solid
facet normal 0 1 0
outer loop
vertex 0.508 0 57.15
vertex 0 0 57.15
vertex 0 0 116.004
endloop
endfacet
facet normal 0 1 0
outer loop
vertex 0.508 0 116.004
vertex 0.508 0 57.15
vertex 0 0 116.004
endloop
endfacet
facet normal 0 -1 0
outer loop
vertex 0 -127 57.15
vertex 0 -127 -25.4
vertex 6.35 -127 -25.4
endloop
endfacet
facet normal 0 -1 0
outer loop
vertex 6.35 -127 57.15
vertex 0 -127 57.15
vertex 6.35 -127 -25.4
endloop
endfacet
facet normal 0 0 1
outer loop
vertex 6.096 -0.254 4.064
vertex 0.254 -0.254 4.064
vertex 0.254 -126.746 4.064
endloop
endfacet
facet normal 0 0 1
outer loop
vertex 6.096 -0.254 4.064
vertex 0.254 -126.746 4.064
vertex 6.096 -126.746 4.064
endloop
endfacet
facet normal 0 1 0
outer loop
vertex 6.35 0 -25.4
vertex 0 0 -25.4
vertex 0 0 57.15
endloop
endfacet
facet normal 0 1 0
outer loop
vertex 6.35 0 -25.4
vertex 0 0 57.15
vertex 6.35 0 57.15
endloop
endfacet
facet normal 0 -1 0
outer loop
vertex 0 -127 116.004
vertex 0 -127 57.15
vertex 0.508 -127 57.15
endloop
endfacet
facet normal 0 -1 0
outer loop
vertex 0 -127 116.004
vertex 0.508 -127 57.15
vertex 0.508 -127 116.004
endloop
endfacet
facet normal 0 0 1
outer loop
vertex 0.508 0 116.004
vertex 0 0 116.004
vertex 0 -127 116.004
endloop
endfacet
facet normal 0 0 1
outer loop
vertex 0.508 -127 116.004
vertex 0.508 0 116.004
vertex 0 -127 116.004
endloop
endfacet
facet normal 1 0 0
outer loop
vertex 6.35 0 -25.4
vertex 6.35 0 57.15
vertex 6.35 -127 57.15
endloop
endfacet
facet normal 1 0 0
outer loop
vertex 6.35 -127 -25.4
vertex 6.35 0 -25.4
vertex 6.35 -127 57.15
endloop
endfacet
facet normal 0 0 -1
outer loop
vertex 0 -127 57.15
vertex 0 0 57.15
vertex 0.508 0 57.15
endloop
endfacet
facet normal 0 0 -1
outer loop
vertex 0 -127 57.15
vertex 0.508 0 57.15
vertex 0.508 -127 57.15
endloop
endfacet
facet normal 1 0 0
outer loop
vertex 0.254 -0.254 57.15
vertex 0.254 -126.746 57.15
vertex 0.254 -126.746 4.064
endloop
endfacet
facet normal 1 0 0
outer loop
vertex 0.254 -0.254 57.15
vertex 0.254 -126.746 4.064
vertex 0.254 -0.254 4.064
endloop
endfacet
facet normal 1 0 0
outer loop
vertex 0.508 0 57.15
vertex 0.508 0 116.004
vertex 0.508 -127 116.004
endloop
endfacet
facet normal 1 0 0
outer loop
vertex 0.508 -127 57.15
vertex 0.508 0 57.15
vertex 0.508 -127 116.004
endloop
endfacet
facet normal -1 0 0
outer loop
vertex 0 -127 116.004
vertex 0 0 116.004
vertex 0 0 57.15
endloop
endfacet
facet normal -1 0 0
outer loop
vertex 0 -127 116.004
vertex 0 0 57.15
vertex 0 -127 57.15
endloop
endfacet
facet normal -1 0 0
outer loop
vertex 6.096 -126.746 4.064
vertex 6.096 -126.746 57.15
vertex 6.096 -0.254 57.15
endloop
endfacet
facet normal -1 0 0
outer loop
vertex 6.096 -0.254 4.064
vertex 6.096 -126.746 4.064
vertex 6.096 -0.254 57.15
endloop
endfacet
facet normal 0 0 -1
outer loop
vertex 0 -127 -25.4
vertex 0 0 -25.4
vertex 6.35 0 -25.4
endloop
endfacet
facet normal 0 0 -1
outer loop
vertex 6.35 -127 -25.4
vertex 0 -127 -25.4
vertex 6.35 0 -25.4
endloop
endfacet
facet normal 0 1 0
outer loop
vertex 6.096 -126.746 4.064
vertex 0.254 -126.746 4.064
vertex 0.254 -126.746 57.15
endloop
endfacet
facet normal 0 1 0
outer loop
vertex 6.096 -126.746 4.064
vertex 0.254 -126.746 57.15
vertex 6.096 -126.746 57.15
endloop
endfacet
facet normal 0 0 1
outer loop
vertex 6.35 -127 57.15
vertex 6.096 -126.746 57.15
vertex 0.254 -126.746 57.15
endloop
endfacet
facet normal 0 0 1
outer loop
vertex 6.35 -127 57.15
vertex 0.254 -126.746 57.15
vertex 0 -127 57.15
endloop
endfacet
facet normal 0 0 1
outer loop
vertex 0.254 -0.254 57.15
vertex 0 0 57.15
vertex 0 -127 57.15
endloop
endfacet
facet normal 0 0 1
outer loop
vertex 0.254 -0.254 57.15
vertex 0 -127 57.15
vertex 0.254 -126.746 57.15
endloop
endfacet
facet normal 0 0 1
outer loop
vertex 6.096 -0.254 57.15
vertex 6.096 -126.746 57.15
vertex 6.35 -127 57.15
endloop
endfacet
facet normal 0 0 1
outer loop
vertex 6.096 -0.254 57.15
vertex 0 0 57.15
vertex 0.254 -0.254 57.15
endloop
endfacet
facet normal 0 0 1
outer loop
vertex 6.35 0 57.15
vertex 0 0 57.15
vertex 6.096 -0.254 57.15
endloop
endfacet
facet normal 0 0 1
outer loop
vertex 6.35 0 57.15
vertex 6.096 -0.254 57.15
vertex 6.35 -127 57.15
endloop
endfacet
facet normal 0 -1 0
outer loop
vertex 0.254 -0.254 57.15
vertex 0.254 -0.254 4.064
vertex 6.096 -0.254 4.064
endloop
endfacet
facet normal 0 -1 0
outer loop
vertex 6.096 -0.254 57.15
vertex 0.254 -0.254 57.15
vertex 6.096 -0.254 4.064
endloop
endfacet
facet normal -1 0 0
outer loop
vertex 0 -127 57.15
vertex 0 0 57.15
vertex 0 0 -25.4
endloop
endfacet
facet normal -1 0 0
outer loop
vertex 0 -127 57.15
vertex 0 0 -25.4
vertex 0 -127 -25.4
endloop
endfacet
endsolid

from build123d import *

# Parameters (mm, degrees)
F0_W     = 6.35
F0_H     = 57.15
F1_DEPTH = 127
F2_W     = 5.842
F2_H     = 126.492
F3_DEPTH = 53.086
F5_DEPTH = 25.4
F6_W     = 6.35
F6_H     = 24.5786048472
F7_DEPTH = 2.54
F8_W     = 127
F8_H     = 58.8536623478
F9_DEPTH = 0.508


with BuildPart() as f1:
    # F0 (on Front) → F1 (new body)
    with BuildSketch(Plane.XZ):
        with Locations((3.175, 28.575)):
            Rectangle(F0_W, F0_H)
    extrude(amount=F1_DEPTH)


with BuildPart() as f3:
    # F2 (on face) → F3 (new body)
    with BuildSketch(Plane.XY.offset(57.15)):
        with Locations((3.175, -63.5)):
            Rectangle(F2_W, F2_H)
    extrude(amount=-F3_DEPTH)


with BuildPart() as f1_1:
    add(f1.part)

    # F4: cut F3
    add(f3.part, mode=Mode.SUBTRACT)

    # F5 (add): a face of the model
    f5_faces = [f1_1.faces().sort_by_distance(p)[0] for p in [
        (3.175, -63.5, 0),
    ]]
    extrude(f5_faces, amount=F5_DEPTH)

    # F6 (on face) → F7 (join)
    with BuildSketch(Plane(origin=(0, 0, -25.4), x_dir=(1, 0, 0), z_dir=(0, 0, -1))):
        with Locations((3.175, 63.9524813741)):
            Rectangle(F6_W, F6_H)
    extrude(amount=-F7_DEPTH)


with BuildPart() as f9:
    # F8 (on face) → F9 (new body)
    with BuildSketch(Plane(origin=(0, 0, 0), x_dir=(0, -1, 0), z_dir=(-1, 0, 0))):
        with Locations((63.5, 86.5768311739)):
            Rectangle(F8_W, F8_H)
    extrude(amount=-F9_DEPTH)


solid = Compound([f1_1.part, f9.part])
